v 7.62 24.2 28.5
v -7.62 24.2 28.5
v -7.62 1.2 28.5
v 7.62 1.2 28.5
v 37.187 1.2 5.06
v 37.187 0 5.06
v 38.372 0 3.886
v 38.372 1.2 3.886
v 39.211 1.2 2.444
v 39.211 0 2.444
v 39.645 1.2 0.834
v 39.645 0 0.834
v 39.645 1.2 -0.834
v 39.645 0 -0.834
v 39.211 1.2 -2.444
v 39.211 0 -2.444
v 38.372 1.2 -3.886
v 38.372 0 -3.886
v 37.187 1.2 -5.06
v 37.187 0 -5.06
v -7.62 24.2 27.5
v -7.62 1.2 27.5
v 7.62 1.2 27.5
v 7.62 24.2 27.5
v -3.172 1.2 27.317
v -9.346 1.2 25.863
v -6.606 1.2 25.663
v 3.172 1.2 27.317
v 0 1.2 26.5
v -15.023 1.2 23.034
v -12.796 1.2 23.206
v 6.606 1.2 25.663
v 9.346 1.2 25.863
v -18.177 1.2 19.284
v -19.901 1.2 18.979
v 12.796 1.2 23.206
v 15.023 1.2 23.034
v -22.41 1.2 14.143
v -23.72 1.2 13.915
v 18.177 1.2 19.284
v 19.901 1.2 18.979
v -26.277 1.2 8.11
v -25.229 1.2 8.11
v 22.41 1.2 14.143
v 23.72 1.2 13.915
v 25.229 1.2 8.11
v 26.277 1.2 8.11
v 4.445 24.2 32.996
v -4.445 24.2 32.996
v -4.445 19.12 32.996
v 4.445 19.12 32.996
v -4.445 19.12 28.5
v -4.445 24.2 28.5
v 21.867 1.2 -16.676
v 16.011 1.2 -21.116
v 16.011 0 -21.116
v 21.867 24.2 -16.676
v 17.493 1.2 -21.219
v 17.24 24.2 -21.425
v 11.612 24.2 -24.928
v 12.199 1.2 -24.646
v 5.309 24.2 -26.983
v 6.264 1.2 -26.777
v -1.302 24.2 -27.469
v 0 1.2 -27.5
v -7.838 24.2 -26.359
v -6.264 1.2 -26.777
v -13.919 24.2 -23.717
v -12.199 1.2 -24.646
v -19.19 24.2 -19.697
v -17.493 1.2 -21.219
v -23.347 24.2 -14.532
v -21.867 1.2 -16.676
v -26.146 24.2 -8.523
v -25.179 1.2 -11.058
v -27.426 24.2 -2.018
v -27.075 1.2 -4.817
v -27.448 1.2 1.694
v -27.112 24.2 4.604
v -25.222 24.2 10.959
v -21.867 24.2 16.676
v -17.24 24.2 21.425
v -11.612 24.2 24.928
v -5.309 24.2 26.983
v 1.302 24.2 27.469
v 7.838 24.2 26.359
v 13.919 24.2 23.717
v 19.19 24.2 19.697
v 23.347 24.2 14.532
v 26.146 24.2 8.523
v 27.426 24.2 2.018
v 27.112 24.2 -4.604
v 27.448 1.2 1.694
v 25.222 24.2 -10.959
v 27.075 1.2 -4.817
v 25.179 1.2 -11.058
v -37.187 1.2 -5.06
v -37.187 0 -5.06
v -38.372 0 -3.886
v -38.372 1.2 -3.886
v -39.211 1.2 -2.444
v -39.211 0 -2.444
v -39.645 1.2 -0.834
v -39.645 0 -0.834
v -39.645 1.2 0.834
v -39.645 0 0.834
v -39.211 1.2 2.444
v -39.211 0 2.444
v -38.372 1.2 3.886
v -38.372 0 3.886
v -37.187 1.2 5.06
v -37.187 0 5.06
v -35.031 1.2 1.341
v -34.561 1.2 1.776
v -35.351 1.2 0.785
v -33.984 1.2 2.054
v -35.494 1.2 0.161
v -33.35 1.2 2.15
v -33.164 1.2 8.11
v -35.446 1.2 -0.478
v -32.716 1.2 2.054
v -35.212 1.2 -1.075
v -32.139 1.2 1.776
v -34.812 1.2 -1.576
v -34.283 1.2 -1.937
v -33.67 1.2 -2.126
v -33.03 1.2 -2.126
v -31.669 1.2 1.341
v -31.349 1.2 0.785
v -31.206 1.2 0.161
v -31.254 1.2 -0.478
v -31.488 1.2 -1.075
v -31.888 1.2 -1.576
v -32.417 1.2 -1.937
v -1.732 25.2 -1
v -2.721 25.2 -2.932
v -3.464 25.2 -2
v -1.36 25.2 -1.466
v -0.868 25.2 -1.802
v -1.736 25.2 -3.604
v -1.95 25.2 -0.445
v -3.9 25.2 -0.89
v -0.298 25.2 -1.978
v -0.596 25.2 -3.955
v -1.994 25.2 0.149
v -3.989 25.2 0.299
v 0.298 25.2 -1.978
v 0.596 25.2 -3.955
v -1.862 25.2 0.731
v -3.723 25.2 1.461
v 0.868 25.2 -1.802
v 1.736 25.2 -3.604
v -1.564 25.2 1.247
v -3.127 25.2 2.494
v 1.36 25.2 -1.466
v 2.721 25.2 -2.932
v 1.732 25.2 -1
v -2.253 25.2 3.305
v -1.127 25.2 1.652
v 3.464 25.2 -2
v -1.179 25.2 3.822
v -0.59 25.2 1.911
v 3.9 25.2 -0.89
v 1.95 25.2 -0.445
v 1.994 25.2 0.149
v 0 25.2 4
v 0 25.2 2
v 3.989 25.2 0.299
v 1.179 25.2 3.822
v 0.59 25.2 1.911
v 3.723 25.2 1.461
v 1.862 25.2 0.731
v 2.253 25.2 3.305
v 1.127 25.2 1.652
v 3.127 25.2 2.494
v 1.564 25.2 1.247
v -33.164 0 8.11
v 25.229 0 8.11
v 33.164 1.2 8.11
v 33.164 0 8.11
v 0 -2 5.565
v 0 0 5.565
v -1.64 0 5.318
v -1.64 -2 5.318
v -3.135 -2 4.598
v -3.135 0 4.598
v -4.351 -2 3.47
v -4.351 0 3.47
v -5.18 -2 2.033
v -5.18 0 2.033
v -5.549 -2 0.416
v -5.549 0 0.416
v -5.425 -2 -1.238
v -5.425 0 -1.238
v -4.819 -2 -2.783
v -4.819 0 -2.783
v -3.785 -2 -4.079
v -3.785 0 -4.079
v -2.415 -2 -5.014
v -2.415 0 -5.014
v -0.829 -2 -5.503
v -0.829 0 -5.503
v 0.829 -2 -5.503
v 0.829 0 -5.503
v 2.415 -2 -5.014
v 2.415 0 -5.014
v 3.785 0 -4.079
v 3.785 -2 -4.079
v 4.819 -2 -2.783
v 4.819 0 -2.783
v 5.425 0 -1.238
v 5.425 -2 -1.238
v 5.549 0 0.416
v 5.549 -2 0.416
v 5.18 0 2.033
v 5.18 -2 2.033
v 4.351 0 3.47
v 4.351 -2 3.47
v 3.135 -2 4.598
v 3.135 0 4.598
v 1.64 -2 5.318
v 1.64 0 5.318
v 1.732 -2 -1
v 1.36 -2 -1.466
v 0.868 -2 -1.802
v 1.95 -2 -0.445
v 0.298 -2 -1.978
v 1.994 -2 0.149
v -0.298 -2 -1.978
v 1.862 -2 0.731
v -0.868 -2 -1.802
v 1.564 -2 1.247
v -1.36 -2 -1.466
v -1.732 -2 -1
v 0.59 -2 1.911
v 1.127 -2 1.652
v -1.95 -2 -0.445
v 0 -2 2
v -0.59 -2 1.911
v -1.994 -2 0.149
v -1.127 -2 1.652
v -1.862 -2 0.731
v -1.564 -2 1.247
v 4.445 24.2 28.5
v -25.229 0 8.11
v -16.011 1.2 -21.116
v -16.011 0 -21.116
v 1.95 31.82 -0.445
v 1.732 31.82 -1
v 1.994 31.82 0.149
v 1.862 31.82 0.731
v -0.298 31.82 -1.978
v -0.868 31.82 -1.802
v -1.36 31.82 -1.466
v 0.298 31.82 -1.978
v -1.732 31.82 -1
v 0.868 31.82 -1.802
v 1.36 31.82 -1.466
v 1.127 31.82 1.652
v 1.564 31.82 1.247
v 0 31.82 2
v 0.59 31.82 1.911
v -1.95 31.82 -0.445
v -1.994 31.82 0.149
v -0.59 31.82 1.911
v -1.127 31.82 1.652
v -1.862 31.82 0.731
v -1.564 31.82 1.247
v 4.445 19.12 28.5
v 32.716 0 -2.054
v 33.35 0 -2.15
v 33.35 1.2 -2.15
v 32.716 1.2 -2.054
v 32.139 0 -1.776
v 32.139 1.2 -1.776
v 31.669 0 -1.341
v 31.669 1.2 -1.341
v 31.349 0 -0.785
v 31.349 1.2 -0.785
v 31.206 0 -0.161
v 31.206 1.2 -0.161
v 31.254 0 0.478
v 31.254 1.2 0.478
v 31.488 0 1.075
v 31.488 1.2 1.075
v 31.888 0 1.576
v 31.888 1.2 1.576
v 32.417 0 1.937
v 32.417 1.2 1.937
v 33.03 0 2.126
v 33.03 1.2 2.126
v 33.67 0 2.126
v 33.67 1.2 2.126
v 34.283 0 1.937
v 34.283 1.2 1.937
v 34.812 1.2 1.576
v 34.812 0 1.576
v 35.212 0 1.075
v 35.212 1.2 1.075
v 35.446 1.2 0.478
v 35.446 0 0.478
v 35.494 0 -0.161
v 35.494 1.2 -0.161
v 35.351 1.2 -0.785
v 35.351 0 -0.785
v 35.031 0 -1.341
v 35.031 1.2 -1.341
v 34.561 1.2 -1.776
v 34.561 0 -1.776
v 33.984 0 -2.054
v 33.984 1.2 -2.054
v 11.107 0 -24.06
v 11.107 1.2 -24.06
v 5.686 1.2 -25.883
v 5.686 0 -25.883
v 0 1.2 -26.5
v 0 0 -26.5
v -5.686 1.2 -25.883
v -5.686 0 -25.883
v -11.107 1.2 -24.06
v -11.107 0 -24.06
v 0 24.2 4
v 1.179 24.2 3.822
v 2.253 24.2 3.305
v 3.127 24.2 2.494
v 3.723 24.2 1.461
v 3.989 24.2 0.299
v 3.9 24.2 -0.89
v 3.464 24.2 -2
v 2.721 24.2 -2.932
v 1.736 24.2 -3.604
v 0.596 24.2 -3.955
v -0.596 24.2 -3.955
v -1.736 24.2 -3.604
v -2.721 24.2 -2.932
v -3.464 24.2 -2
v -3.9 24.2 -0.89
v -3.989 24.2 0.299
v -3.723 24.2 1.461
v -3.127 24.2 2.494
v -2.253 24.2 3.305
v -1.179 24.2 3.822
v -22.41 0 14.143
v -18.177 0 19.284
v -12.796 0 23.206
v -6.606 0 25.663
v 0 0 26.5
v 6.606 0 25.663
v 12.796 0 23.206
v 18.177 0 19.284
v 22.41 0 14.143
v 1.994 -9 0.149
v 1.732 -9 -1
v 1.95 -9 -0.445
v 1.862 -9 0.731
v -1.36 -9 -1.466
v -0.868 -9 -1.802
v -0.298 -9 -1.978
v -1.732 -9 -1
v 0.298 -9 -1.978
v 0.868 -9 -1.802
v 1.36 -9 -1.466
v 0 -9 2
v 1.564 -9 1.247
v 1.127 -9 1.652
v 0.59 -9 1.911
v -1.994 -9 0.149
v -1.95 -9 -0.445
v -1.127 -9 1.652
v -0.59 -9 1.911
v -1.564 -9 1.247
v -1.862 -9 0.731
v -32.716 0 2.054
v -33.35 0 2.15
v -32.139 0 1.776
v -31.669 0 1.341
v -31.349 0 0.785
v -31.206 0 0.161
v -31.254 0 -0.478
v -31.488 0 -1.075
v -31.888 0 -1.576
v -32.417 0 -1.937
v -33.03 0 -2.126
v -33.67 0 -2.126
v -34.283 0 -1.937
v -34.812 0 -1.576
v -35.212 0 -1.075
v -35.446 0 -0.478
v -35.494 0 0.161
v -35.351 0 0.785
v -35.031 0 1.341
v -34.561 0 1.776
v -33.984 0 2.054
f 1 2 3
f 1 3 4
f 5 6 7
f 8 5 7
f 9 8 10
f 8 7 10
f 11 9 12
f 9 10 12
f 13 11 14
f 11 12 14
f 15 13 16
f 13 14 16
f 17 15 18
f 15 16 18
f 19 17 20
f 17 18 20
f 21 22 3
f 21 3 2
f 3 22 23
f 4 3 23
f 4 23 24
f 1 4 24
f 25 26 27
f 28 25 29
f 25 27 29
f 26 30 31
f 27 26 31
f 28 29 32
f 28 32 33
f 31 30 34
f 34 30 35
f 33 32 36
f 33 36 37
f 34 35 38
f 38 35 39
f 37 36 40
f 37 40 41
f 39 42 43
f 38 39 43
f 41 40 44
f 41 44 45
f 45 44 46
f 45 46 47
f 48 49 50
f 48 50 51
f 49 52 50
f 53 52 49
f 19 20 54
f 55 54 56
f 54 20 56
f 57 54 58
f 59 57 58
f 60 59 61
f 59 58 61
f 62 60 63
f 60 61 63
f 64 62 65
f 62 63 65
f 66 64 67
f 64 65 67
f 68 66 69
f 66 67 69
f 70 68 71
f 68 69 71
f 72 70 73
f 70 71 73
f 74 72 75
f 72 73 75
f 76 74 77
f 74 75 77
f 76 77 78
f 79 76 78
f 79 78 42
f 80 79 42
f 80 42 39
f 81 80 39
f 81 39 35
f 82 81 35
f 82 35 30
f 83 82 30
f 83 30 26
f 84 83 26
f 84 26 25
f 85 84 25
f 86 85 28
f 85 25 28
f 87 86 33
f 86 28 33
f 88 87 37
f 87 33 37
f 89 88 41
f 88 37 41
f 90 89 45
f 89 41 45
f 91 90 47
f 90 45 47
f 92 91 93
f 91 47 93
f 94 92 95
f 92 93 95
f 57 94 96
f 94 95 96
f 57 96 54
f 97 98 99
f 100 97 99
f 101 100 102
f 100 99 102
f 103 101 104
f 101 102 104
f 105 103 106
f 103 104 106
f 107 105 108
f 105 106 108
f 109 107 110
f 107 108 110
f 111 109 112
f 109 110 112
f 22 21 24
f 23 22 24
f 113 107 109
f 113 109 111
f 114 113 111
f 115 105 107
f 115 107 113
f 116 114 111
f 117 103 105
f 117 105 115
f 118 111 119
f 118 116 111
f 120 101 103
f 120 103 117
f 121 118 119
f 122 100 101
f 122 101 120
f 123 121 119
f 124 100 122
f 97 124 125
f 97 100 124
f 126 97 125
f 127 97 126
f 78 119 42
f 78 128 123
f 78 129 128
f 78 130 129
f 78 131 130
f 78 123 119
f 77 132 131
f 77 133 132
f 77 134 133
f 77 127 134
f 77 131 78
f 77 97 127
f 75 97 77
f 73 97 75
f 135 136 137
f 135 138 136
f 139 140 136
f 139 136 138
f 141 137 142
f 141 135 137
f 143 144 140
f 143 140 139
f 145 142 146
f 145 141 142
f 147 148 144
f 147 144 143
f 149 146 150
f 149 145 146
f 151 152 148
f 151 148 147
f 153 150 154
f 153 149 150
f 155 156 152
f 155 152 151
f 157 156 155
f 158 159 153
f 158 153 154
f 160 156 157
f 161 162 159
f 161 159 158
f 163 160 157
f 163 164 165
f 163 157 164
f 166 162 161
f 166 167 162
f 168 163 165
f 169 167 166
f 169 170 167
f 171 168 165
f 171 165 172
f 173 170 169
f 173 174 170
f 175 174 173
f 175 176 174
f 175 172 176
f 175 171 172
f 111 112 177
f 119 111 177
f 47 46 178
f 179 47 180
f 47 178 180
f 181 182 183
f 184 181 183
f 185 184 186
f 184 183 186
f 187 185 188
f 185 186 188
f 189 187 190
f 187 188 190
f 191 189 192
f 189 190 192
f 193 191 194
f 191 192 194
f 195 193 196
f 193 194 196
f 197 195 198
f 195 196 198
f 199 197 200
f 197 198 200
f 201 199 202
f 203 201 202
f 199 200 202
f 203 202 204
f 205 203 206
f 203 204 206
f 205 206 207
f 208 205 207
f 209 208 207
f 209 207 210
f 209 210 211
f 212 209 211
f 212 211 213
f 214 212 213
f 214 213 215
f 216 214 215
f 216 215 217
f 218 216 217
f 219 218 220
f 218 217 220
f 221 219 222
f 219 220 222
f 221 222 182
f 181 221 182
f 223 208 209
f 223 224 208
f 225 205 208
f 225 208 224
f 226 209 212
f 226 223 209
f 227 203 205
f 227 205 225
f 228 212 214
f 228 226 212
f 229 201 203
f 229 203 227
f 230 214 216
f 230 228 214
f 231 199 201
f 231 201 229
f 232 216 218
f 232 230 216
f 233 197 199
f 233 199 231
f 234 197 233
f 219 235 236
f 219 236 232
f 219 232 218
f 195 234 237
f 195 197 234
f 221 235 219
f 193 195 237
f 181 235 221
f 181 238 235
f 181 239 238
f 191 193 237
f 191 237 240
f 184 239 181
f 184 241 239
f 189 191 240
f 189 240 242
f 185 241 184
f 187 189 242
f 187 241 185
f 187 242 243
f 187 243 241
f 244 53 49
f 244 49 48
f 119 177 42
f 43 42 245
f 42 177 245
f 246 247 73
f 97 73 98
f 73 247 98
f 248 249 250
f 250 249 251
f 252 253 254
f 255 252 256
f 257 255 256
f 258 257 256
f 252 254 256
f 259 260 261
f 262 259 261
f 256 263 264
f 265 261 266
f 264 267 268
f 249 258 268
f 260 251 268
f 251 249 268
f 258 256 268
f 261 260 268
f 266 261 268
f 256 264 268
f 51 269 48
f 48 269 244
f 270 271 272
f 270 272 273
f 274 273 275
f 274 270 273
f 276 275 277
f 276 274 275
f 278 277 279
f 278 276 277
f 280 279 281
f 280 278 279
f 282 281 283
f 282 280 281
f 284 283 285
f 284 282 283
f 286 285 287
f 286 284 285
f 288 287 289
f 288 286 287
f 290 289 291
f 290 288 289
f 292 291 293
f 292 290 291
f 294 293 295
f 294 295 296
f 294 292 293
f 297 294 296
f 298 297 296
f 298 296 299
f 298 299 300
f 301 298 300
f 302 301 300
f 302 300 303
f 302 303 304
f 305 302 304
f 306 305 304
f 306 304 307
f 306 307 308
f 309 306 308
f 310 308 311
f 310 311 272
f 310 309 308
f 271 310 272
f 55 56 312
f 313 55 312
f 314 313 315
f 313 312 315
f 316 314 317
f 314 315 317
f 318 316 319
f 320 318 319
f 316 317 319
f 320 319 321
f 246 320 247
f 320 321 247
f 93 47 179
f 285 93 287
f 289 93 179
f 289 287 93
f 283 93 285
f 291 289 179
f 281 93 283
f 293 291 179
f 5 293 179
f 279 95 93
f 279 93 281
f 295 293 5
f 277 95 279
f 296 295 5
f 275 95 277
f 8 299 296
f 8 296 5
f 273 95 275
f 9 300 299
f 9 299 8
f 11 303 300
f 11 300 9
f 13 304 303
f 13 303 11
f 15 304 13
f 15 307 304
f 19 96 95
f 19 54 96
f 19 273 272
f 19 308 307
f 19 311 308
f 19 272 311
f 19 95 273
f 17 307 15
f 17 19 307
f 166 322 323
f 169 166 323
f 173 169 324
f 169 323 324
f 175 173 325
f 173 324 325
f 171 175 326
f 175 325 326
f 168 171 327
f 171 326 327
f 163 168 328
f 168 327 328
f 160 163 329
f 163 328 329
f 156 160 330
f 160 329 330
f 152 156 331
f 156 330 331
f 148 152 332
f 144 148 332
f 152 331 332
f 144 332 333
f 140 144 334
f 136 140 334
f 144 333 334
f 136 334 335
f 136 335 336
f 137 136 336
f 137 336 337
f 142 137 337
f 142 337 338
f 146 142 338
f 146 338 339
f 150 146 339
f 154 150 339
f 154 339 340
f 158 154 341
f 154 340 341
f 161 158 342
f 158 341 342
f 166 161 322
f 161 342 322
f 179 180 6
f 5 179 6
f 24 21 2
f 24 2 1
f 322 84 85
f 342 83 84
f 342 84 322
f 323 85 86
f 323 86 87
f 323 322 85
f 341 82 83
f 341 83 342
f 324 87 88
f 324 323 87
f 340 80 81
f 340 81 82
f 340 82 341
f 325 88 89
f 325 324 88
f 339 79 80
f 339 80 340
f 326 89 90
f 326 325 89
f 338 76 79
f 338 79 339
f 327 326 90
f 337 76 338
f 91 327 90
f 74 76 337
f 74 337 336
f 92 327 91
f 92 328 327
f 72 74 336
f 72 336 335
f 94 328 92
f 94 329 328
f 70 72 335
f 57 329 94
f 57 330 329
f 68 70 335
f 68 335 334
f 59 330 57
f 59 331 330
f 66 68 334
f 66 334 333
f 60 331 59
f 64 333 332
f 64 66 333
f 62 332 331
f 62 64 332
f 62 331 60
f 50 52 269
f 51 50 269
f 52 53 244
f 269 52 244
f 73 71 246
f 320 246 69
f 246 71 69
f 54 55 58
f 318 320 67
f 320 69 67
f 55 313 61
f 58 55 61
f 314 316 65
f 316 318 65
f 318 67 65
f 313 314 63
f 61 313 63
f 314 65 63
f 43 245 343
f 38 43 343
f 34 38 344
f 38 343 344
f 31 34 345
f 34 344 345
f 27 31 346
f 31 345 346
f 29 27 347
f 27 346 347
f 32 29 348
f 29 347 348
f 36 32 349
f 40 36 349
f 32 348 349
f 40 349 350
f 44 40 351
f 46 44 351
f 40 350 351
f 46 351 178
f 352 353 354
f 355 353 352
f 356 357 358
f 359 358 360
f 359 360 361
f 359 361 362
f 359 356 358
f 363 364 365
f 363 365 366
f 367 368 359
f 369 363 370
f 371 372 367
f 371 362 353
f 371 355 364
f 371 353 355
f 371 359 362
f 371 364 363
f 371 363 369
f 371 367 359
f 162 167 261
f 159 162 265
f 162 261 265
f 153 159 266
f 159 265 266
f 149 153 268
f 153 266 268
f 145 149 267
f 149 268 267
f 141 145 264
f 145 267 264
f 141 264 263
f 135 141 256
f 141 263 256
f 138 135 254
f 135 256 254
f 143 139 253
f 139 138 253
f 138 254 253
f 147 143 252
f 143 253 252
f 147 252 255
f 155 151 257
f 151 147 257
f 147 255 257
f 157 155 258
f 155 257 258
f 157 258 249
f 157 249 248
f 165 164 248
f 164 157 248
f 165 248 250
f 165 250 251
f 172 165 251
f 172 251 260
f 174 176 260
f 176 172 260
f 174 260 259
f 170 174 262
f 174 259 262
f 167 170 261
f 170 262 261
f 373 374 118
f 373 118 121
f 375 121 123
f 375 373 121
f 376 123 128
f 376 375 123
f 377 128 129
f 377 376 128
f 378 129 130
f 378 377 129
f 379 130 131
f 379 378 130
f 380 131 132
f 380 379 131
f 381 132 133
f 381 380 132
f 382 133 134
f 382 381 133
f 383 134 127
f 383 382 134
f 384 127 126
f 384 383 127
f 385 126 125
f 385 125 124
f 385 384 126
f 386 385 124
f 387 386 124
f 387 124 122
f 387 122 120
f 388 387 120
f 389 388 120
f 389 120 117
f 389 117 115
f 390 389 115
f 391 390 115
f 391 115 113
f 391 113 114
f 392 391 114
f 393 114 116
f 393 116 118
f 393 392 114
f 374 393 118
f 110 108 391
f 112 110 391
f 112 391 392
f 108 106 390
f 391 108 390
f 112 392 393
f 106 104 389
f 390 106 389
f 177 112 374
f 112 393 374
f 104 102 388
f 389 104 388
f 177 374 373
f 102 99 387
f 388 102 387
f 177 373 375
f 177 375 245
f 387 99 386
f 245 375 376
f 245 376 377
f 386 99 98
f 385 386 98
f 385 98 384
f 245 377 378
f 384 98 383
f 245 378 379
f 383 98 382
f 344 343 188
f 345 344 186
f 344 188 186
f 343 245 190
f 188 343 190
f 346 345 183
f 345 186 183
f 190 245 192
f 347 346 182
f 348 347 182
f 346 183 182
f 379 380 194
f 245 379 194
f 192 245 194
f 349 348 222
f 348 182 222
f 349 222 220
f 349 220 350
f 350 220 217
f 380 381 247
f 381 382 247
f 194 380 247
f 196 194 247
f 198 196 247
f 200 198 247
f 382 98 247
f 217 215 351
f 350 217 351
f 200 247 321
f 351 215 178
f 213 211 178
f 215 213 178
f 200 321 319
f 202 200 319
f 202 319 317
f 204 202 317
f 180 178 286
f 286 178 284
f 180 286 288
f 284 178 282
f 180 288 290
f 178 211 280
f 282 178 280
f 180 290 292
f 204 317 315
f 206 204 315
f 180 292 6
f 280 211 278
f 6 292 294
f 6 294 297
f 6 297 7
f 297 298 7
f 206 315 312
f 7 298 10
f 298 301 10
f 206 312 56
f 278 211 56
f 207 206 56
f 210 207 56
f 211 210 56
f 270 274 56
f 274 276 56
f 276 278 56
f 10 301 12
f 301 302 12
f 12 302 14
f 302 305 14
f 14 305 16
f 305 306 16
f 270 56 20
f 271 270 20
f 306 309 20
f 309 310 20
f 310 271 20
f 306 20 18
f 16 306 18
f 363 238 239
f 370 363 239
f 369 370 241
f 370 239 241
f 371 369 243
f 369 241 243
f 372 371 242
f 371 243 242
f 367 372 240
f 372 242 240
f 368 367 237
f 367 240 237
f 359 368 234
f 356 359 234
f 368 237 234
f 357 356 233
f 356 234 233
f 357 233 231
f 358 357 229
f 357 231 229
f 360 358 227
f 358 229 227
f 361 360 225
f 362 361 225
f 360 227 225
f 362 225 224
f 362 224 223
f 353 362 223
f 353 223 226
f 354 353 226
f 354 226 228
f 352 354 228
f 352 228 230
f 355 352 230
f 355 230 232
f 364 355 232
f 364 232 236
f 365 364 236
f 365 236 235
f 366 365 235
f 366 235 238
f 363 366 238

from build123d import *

# Parameters (mm, degrees)
SKETCH1_R        = 2.15
BASEPLATE_DEPTH  = 1.2
CASE_START       = 1.2
SKETCH2_R        = 27.5
CASE_2_DEPTH     = 23
SHAFT_DEPTH      = 9
SHAFT_DEPTH_BACK = 31.82
SKETCH3_R        = 2
SKETCH4_R        = 5.565
FRONTBOSS_DEPTH  = 2
SKETCH5_R        = 4
REARBOSS_DEPTH   = 1
PCB_START        = 27.5
SKETCH7_W        = 15.24
SKETCH7_H        = 23
PCB_DEPTH        = 1
SKETCH8_W        = 8.89
SKETCH8_H        = 5.08
PLUG_DEPTH       = 4.4958


with BuildPart() as part:
    # Sketch1 → BasePlate (new body)
    with BuildSketch(Plane(origin=(0, 0, 0), x_dir=(1, 0, 0), z_dir=(0, 1, 0))):
        with BuildLine():
            Line((-16.011244378, 21.116108862), (-37.186656672, 5.059897784))
            ThreePointArc((-37.186656672, 5.059897784), (-39.7, 0), (-37.186656672, -5.059897784))
            Line((-37.186656672, -5.059897784), (-33.164090473, -8.11))
            Line((-33.164090473, -8.11), (-25.22851363, -8.11))
            ThreePointArc((-25.22851363, -8.11), (0, -26.5), (25.22851363, -8.11))
            Line((25.22851363, -8.11), (33.164090473, -8.11))
            Line((33.164090473, -8.11), (37.186656672, -5.059897784))
            ThreePointArc((37.186656672, -5.059897784), (39.7, 0), (37.186656672, 5.059897784))
            Line((37.186656672, 5.059897784), (16.011244378, 21.116108862))
            ThreePointArc((16.011244378, 21.116108862), (0, 26.5), (-16.011244378, 21.116108862))
        make_face()
        with Locations(Location((-33.35, 0, 0), (0, 0, 270))):
            Circle(SKETCH1_R, mode=Mode.SUBTRACT)
        with Locations(Location((33.35, 0, 0), (0, 0, 90))):
            Circle(SKETCH1_R, mode=Mode.SUBTRACT)
    extrude(amount=BASEPLATE_DEPTH)

    # Sketch2 → Case 2 (add)
    with BuildSketch(Plane(origin=(0, 0, 0), x_dir=(1, 0, 0), z_dir=(0, 1, 0)).offset(CASE_START)):
        with Locations(Location((0, 0, 0), (0, 0, 37.330121736))):
            Circle(SKETCH2_R)
    extrude(amount=CASE_2_DEPTH)

    # Sketch3 → Shaft (add, two sides: drawn at the far end of the back side and taken through both)
    with BuildSketch(Plane.XZ.offset(-SHAFT_DEPTH_BACK)):
        with Locations(Location((0, 0, 0), (0, 0, 90))):
            Circle(SKETCH3_R)
    extrude(amount=SHAFT_DEPTH + SHAFT_DEPTH_BACK)

    # Sketch4 → FrontBoss (add)
    with BuildSketch(Plane.XZ):
        with Locations(Location((0, 0, 0), (0, 0, 90))):
            Circle(SKETCH4_R)
    extrude(amount=FRONTBOSS_DEPTH)

    # Sketch5 → RearBoss (add)
    with BuildSketch(Plane(origin=(0, 24.2, 0), x_dir=(1, 0, 0), z_dir=(0, 1, 0))):
        with Locations(Location((0, 0, 0), (0, 0, 270))):
            Circle(SKETCH5_R)
    extrude(amount=REARBOSS_DEPTH)


with BuildPart() as body_2:
    # Sketch7 → PCB (new body)
    with BuildSketch(Plane.XY.offset(PCB_START)):
        with Locations((0, 12.7)):
            Rectangle(SKETCH7_W, SKETCH7_H)
    extrude(amount=PCB_DEPTH)


with BuildPart() as body_3:
    # Sketch8 → Plug (new body)
    with BuildSketch(Plane.XY.offset(28.5)):
        with Locations((0, 21.66)):
            Rectangle(SKETCH8_W, SKETCH8_H)
    extrude(amount=PLUG_DEPTH)


solid = Compound([part.part, body_2.part, body_3.part])
